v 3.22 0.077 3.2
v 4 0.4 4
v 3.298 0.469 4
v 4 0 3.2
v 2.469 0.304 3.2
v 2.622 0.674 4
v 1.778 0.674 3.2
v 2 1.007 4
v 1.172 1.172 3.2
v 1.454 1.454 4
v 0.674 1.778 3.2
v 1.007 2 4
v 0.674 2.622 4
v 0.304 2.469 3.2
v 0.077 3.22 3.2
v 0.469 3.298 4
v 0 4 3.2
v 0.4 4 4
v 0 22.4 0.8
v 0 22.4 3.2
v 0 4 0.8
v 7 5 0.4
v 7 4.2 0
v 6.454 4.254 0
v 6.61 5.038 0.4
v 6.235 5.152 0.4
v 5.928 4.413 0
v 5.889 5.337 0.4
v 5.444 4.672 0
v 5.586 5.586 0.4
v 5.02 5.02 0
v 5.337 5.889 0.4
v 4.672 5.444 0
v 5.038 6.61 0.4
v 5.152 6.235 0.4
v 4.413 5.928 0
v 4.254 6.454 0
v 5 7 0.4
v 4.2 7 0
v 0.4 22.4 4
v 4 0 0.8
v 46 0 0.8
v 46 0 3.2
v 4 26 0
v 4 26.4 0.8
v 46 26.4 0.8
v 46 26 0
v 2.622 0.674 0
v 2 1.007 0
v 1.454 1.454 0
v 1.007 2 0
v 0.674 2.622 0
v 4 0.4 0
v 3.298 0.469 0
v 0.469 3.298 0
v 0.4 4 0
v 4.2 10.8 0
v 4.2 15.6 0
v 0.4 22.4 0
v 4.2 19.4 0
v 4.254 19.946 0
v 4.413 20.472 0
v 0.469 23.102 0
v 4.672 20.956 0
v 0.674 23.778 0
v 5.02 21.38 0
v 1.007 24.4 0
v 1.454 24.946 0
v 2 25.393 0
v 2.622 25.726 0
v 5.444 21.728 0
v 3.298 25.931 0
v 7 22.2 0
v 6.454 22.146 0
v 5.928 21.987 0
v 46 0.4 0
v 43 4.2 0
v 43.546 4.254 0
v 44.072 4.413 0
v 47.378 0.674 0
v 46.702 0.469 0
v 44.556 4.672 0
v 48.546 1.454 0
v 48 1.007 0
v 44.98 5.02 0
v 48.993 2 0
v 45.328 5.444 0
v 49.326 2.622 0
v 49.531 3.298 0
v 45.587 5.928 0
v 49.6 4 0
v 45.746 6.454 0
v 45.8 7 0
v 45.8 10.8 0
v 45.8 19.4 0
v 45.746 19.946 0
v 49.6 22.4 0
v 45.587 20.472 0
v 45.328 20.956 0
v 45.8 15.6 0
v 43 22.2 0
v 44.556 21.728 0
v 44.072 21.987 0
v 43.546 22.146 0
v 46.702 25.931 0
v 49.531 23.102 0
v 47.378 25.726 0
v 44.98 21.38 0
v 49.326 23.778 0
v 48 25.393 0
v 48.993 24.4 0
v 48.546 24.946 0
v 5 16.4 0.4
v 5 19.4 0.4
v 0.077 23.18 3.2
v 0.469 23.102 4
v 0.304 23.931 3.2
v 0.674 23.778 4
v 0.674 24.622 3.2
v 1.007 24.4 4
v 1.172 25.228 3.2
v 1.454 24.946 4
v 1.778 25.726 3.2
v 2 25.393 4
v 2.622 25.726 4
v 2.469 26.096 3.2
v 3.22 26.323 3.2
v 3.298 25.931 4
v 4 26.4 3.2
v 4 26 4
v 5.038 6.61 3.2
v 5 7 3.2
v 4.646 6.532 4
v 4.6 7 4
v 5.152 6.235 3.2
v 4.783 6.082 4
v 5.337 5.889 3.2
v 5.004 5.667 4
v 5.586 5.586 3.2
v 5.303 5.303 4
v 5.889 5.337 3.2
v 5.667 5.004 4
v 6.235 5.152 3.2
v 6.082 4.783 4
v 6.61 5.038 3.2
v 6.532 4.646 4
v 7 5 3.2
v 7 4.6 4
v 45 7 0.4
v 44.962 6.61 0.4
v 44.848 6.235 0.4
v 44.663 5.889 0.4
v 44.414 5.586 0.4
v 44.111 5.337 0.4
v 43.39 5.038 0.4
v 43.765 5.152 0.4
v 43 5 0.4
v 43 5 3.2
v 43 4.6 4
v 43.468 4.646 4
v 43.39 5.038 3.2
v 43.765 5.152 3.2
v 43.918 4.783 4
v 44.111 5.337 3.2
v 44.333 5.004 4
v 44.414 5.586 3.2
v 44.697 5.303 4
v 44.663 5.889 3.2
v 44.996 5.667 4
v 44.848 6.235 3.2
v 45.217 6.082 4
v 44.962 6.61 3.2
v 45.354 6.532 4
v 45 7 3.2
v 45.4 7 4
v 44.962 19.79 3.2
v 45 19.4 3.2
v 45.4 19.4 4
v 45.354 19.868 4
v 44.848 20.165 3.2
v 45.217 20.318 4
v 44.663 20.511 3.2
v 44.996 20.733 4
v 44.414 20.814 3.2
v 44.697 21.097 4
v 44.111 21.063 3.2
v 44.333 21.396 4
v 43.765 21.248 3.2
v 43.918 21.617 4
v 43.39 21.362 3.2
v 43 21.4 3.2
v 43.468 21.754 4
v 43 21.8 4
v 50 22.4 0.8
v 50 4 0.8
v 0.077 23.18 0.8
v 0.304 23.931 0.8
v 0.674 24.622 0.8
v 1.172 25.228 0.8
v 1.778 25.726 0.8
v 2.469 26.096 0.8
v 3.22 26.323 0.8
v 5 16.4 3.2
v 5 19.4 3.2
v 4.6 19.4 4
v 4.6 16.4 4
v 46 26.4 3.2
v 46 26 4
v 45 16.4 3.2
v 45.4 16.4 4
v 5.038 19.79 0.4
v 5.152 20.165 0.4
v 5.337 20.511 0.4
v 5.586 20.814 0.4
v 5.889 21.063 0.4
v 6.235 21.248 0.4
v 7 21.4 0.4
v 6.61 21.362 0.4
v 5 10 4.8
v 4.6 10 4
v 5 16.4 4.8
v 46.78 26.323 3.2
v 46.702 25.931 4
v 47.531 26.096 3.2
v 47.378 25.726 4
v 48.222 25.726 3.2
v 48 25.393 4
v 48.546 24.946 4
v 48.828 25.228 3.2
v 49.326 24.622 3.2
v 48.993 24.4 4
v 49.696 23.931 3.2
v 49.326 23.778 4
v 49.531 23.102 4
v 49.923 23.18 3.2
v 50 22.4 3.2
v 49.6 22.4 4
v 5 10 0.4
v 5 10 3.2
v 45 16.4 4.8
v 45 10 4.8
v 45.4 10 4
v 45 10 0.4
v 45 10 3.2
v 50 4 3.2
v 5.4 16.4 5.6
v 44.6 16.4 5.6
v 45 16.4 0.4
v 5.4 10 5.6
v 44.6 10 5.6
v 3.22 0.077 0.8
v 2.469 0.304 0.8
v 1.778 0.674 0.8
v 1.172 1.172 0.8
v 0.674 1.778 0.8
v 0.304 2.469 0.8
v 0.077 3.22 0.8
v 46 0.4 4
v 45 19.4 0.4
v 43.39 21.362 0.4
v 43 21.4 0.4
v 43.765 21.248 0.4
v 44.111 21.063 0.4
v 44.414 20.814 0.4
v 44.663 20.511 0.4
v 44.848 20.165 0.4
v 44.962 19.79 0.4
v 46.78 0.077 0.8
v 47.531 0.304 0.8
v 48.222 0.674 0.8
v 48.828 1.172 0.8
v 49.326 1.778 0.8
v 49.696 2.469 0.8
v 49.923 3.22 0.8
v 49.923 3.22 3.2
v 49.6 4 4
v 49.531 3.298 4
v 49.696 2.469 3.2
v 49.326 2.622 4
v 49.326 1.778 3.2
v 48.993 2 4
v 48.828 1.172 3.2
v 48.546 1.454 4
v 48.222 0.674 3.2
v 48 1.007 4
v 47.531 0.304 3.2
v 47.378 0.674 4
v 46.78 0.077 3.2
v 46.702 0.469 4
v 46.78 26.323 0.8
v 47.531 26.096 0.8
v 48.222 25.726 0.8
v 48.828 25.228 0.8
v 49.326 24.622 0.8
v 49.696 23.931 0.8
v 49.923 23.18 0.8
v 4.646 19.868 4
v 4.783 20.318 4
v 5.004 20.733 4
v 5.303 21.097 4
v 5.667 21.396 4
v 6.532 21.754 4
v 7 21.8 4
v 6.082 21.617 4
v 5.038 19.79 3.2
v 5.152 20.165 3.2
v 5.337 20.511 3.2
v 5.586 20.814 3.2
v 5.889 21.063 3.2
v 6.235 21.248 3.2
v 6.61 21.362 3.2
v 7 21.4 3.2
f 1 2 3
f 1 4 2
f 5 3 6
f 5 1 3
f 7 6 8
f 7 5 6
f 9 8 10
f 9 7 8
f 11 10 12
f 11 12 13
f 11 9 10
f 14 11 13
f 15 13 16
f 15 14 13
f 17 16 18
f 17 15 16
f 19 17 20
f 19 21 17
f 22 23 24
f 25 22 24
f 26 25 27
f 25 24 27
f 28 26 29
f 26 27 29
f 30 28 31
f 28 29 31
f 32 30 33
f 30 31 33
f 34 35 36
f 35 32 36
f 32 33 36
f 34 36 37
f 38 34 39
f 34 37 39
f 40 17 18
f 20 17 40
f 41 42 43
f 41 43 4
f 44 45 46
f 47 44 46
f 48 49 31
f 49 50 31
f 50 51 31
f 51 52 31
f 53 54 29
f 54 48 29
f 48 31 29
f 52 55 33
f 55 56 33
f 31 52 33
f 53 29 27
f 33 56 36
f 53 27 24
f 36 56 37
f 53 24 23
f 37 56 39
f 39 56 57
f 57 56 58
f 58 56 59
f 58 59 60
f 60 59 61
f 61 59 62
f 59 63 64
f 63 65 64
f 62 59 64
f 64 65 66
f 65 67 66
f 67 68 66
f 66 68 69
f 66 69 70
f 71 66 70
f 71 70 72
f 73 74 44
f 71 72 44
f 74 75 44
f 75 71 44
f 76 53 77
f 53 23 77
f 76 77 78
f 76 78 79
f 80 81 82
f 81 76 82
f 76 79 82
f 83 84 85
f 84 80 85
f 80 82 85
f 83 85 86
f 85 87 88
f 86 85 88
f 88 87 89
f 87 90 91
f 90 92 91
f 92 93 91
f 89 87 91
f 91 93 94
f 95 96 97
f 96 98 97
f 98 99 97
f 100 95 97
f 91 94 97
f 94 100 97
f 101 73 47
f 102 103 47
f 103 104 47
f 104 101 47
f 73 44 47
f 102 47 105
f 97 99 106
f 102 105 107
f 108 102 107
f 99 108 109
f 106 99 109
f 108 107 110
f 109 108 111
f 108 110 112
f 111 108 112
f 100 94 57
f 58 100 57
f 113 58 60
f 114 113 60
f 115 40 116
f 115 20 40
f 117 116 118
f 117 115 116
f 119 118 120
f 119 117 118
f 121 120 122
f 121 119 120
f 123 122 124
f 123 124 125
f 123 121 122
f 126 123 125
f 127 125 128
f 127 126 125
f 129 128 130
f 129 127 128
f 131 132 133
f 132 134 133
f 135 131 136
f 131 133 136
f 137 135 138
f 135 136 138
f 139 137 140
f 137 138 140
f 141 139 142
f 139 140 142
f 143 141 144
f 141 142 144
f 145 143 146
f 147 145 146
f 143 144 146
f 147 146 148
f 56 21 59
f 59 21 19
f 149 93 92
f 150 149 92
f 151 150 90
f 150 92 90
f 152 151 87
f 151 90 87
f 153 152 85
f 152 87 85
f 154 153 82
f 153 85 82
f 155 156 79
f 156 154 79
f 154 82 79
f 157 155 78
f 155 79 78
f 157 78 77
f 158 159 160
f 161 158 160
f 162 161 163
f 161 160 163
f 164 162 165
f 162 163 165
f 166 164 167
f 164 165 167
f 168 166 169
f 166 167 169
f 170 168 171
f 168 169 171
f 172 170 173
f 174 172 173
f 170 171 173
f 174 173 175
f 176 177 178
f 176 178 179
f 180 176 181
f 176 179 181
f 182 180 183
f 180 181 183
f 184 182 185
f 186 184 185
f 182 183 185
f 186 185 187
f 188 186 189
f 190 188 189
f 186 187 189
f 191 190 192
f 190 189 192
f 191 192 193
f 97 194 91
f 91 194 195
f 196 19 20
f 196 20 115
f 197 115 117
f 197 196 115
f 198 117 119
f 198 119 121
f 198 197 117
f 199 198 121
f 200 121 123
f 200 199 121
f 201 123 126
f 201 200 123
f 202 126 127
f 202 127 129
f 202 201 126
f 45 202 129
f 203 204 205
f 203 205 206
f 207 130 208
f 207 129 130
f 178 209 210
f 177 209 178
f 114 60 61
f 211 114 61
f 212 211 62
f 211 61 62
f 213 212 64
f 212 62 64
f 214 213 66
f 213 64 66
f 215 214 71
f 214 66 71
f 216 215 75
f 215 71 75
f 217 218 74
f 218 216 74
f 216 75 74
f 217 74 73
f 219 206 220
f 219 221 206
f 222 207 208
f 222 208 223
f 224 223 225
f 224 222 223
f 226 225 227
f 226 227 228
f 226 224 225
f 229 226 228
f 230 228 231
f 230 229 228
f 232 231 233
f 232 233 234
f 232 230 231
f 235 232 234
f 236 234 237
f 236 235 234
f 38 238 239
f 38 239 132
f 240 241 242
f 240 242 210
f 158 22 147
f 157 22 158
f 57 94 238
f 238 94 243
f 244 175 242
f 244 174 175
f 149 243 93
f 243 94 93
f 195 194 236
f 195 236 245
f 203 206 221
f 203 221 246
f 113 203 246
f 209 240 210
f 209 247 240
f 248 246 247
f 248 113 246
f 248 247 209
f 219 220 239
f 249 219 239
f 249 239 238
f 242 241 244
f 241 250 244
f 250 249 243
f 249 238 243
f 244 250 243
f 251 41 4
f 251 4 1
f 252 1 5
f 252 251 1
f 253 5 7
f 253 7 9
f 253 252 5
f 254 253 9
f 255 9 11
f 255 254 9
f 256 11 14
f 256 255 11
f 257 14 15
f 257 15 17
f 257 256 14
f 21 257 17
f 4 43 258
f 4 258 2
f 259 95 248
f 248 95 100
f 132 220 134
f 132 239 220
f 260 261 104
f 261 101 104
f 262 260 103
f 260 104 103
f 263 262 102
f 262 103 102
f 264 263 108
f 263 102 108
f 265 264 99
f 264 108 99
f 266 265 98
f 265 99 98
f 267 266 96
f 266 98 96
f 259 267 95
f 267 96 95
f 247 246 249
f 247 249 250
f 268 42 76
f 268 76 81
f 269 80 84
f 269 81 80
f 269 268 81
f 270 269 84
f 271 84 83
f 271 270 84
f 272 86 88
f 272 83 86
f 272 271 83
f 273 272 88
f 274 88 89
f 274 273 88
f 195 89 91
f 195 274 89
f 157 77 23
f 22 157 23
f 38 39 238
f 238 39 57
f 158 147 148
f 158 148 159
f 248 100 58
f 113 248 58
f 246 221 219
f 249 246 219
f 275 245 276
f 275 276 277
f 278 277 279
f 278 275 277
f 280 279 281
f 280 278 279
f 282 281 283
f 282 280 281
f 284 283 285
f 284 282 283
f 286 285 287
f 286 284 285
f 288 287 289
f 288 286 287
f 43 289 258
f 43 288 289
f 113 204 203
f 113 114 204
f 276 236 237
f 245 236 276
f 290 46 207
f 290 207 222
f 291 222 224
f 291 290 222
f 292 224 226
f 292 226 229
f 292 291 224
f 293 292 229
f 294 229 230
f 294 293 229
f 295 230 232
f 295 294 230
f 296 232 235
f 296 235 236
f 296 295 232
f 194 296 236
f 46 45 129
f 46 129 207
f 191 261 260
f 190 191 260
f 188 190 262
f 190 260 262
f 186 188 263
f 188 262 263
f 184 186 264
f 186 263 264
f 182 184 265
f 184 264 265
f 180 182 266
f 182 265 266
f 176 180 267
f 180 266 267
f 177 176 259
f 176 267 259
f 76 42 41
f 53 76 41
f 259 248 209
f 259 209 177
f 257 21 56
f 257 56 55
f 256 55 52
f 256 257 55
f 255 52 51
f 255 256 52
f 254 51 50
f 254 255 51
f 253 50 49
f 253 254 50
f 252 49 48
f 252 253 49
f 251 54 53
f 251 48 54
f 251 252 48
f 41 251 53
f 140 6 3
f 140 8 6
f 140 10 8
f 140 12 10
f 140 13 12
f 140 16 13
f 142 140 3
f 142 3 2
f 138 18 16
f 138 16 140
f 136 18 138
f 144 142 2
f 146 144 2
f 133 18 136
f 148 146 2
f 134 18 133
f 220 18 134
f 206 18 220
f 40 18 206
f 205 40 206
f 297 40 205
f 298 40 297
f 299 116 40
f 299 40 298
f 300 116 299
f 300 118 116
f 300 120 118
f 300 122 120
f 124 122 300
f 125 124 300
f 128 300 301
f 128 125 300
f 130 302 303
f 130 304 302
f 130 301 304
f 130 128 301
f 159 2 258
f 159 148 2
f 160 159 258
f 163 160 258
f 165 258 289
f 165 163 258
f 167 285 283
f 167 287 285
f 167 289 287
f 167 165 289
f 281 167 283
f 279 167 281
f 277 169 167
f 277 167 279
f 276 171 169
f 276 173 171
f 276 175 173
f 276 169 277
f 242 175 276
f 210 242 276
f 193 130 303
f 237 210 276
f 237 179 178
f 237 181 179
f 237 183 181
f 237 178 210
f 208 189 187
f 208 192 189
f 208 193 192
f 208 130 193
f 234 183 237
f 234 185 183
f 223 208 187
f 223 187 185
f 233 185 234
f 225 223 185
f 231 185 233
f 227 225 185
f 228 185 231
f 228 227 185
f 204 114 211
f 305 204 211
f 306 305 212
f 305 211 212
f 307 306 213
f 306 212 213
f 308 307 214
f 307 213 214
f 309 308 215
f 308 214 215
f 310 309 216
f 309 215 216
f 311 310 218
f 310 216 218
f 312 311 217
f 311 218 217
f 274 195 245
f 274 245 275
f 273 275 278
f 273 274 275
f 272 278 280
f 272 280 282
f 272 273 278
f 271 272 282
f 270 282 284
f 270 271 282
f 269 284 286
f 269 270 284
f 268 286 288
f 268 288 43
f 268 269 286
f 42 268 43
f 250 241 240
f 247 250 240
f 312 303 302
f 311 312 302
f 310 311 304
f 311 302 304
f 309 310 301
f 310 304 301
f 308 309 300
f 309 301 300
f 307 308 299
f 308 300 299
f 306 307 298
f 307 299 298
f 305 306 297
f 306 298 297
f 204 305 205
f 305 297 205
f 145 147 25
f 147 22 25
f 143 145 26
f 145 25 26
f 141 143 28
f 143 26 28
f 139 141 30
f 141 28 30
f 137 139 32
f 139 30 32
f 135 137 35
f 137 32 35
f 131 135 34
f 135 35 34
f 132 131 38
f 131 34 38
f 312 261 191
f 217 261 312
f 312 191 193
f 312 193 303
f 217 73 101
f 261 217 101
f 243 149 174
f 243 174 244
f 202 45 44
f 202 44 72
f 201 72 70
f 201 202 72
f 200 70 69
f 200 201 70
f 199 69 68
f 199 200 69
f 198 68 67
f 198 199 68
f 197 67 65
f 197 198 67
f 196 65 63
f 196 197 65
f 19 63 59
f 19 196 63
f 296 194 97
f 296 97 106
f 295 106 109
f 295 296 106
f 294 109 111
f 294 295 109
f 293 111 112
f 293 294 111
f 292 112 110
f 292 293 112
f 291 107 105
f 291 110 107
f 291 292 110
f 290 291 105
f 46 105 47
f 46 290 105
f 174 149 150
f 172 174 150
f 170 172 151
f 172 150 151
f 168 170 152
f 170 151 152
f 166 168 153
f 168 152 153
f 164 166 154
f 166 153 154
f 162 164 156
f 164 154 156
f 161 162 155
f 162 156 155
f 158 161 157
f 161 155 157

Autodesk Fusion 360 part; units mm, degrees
sketch "Sketch1" plane through (0, 0, 0) normal (0, 0, 1) x (1, 0, 0)
  line L0 (4, 0) -> (46, 0) construction
  line L1 (50, 0) -> (50, 22.4) construction
  line L2 (50, 26.4) -> (0, 26.4) construction
  line L3 (0, 22.4) -> (0, 0) construction
  line L4 (0, 13.2) -> (50, 13.2) construction
  line L5 (0, 16.4) -> (50, 16.4)
  line L6 (50, 16.4) -> (50, 13.2)
  line L7 (50, 13.2) -> (0, 13.2)
  line L8 (0, 13.2) -> (0, 16.4)
  line L9 (4, 26.4) -> (46, 26.4)
  line L10 (50, 26.4) -> (50, 4)
  line L11 (50, 0) -> (0, 0)
  line L12 (0, 4) -> (0, 26.4)
  line L13 (7, 5) -> (43, 5)
  line L14 (45, 7) -> (45, 19.4)
  line L15 (43, 21.4) -> (7, 21.4)
  line L16 (5, 19.4) -> (5, 7)
  line L17 (0, 10) -> (50, 10)
  arc A0 (4, 26.4) -> (0, 22.4) centre (4, 22.4) ccw
  arc A1 (0, 4) -> (4, 0) centre (4, 4) ccw
  arc A2 (46, 0) -> (50, 4) centre (46, 4) ccw
  arc A3 (50, 22.4) -> (46, 26.4) centre (46, 22.4) ccw
  arc A4 (7, 21.4) -> (5, 19.4) centre (7, 19.4) ccw
  arc A5 (5, 7) -> (7, 5) centre (7, 7) ccw
  arc A6 (43, 5) -> (45, 7) centre (43, 7) ccw
  arc A7 (45, 19.4) -> (43, 21.4) centre (43, 19.4) ccw
  line L18 (4.2, 16.4) -> (4.2, 10)
  line L19 (45.8, 16.4) -> (45.8, 10)
  point P0 (0, 13.2)
  dimension "d3" = 3.2
  dimension "d5" = 4
  dimension "d6" = 2
  dimension "d11" = 5
  dimension "d13" = 5
  dimension "d14" = 5
  dimension "d15" = 5
  dimension "d16" = 5
  dimension "d17" = 5
  dimension "d18" = 40
  dimension "d24" = 0.8
  dimension "d26" = 0.8
extrude "Extrude1" add sketch "Sketch1" along normal blind 4 contours L5 L9 L10 L12 L14 L15 L16 A0 A3 A4 A7 | L5 L7 L8 L12 L18 | L5 L7 L16 L18 | L7 L12 L17 L18 | L5 L7 L14 L16 | L7 L16 L17 L18 | L10 L11 L12 L13 L14 L16 L17 A1 A2 A5 A6 | L5 L7 L14 L19 | L7 L14 L16 L17 | L5 L6 L7 L10 L19 | L7 L14 L17 L19 | L7 L10 L17 L19
chamfer "Chamfer1" distance 0.4 distance2 0.8 38 edges at (44.4142, 20.8142, 0) (25, 21.4, 0) (5.5858, 20.8142, 0) (5, 17.9, 0) (45, 17.9, 0) (25, 5, 0) (44.4142, 5.5858, 0) (45, 8.5, 0) (5, 8.5, 0) (5.5858, 5.5858, 0) (25, 0, 0) (1.1716, 1.1716, 0) (0, 13.2, 0) (1.1716, 25.2284, 0) (25, 26.4, 0) (48.8284, 25.2284, 0) (50, 13.2, 0) (48.8284, 1.1716, 0) (25, 0, 4) (48.8284, 1.1716, 4) (50, 13.2, 4) (48.8284, 25.2284, 4) (25, 26.4, 4) (1.1716, 25.2284, 4) (0, 13.2, 4) (1.1716, 1.1716, 4) (25, 21.4, 4) (5.5858, 20.8142, 4) (5, 17.9, 4) (45, 17.9, 4) (44.4142, 20.8142, 4) (25, 5, 4) (44.4142, 5.5858, 4) (45, 8.5, 4) (5, 8.5, 4) (5.5858, 5.5858, 4) (25, 10, 0) (25, 16.4, 0) measured on face at (43.0952, 21.3977, 2.6667) measured on face at (31, 21.4, 1.3333) measured on face at (5.0023, 19.4952, 2.6667) measured on face at (5, 18.4, 1.3333) measured on face at (45, 17.4, 1.3333) measured on face at (19, 5, 1.3333) measured on face at (43.0952, 5.0023, 1.3333) measured on face at (45, 8, 1.3333) measured on face at (5, 9, 1.3333) measured on face at (5.1433, 6.2567, 2.6667) measured on face at (18.3333, 12.1333, 0) measured on face at (2.1671, 0.4447, 2.6667) measured on face at (18.3333, 12.1333, 0) measured on face at (0.22, 23.7083, 2.6667) measured on face at (18.3333, 12.1333, 0) measured on face at (49.4641, 24.4, 2.6667) measured on face at (18.3333, 12.1333, 0) measured on face at (46.943, 0.1128, 2.6667) measured on face at (18.3333, 12.1333, 4) measured on face at (18.3333, 12.1333, 4) measured on face at (18.3333, 12.1333, 4) measured on face at (18.3333, 12.1333, 4) measured on face at (18.3333, 12.1333, 4) measured on face at (18.3333, 12.1333, 4) measured on face at (18.3333, 12.1333, 4) measured on face at (18.3333, 12.1333, 4) measured on face at (18.3333, 12.1333, 4) measured on face at (18.3333, 12.1333, 4) measured on face at (18.3333, 12.1333, 4) measured on face at (18.3333, 12.1333, 4) measured on face at (18.3333, 12.1333, 4) measured on face at (18.3333, 12.1333, 4) measured on face at (18.3333, 12.1333, 4) measured on face at (18.3333, 12.1333, 4) measured on face at (18.3333, 12.1333, 4) measured on face at (18.3333, 12.1333, 4) measured on face at (18.3333, 10, 2.6667) measured on face at (18.3333, 16.4, 1.3333)
extrude "Extrude2" add sketch "Sketch1" along normal blind 1.6 from surface at 4 contours L5 L7 L14 L16 | L7 L14 L16 L17
chamfer "Chamfer2" distance 0.4 distance2 0.8 4 edges at (45, 13.2, 4) (5, 13.2, 4) (5, 13.2, 5.6) (45, 13.2, 5.6) measured on face at (19, 24.6, 4) measured on face at (19, 24.6, 4) measured on face at (18.3333, 14.2667, 5.6) measured on face at (18.3333, 14.2667, 5.6)
equation "d3 = ( 6.4 / 2 ) * 1 mm"
equation "d10 = Bevel_Horizontal"
equation "d11 = Linear Dimension-5"
equation "d13 = d11"
equation "d14 = d11"
equation "d15 = d11"
equation "d16 = d14"
equation "d17 = d14"
equation "d18 = Linear Dimension-9"
equation "d24 = Bevel_Horizontal"
equation "Bevel_Horizontal = 0.8 mm"
equation "d26 = Bevel_Horizontal"
equation "d28 = Bevel_Horizontal"
